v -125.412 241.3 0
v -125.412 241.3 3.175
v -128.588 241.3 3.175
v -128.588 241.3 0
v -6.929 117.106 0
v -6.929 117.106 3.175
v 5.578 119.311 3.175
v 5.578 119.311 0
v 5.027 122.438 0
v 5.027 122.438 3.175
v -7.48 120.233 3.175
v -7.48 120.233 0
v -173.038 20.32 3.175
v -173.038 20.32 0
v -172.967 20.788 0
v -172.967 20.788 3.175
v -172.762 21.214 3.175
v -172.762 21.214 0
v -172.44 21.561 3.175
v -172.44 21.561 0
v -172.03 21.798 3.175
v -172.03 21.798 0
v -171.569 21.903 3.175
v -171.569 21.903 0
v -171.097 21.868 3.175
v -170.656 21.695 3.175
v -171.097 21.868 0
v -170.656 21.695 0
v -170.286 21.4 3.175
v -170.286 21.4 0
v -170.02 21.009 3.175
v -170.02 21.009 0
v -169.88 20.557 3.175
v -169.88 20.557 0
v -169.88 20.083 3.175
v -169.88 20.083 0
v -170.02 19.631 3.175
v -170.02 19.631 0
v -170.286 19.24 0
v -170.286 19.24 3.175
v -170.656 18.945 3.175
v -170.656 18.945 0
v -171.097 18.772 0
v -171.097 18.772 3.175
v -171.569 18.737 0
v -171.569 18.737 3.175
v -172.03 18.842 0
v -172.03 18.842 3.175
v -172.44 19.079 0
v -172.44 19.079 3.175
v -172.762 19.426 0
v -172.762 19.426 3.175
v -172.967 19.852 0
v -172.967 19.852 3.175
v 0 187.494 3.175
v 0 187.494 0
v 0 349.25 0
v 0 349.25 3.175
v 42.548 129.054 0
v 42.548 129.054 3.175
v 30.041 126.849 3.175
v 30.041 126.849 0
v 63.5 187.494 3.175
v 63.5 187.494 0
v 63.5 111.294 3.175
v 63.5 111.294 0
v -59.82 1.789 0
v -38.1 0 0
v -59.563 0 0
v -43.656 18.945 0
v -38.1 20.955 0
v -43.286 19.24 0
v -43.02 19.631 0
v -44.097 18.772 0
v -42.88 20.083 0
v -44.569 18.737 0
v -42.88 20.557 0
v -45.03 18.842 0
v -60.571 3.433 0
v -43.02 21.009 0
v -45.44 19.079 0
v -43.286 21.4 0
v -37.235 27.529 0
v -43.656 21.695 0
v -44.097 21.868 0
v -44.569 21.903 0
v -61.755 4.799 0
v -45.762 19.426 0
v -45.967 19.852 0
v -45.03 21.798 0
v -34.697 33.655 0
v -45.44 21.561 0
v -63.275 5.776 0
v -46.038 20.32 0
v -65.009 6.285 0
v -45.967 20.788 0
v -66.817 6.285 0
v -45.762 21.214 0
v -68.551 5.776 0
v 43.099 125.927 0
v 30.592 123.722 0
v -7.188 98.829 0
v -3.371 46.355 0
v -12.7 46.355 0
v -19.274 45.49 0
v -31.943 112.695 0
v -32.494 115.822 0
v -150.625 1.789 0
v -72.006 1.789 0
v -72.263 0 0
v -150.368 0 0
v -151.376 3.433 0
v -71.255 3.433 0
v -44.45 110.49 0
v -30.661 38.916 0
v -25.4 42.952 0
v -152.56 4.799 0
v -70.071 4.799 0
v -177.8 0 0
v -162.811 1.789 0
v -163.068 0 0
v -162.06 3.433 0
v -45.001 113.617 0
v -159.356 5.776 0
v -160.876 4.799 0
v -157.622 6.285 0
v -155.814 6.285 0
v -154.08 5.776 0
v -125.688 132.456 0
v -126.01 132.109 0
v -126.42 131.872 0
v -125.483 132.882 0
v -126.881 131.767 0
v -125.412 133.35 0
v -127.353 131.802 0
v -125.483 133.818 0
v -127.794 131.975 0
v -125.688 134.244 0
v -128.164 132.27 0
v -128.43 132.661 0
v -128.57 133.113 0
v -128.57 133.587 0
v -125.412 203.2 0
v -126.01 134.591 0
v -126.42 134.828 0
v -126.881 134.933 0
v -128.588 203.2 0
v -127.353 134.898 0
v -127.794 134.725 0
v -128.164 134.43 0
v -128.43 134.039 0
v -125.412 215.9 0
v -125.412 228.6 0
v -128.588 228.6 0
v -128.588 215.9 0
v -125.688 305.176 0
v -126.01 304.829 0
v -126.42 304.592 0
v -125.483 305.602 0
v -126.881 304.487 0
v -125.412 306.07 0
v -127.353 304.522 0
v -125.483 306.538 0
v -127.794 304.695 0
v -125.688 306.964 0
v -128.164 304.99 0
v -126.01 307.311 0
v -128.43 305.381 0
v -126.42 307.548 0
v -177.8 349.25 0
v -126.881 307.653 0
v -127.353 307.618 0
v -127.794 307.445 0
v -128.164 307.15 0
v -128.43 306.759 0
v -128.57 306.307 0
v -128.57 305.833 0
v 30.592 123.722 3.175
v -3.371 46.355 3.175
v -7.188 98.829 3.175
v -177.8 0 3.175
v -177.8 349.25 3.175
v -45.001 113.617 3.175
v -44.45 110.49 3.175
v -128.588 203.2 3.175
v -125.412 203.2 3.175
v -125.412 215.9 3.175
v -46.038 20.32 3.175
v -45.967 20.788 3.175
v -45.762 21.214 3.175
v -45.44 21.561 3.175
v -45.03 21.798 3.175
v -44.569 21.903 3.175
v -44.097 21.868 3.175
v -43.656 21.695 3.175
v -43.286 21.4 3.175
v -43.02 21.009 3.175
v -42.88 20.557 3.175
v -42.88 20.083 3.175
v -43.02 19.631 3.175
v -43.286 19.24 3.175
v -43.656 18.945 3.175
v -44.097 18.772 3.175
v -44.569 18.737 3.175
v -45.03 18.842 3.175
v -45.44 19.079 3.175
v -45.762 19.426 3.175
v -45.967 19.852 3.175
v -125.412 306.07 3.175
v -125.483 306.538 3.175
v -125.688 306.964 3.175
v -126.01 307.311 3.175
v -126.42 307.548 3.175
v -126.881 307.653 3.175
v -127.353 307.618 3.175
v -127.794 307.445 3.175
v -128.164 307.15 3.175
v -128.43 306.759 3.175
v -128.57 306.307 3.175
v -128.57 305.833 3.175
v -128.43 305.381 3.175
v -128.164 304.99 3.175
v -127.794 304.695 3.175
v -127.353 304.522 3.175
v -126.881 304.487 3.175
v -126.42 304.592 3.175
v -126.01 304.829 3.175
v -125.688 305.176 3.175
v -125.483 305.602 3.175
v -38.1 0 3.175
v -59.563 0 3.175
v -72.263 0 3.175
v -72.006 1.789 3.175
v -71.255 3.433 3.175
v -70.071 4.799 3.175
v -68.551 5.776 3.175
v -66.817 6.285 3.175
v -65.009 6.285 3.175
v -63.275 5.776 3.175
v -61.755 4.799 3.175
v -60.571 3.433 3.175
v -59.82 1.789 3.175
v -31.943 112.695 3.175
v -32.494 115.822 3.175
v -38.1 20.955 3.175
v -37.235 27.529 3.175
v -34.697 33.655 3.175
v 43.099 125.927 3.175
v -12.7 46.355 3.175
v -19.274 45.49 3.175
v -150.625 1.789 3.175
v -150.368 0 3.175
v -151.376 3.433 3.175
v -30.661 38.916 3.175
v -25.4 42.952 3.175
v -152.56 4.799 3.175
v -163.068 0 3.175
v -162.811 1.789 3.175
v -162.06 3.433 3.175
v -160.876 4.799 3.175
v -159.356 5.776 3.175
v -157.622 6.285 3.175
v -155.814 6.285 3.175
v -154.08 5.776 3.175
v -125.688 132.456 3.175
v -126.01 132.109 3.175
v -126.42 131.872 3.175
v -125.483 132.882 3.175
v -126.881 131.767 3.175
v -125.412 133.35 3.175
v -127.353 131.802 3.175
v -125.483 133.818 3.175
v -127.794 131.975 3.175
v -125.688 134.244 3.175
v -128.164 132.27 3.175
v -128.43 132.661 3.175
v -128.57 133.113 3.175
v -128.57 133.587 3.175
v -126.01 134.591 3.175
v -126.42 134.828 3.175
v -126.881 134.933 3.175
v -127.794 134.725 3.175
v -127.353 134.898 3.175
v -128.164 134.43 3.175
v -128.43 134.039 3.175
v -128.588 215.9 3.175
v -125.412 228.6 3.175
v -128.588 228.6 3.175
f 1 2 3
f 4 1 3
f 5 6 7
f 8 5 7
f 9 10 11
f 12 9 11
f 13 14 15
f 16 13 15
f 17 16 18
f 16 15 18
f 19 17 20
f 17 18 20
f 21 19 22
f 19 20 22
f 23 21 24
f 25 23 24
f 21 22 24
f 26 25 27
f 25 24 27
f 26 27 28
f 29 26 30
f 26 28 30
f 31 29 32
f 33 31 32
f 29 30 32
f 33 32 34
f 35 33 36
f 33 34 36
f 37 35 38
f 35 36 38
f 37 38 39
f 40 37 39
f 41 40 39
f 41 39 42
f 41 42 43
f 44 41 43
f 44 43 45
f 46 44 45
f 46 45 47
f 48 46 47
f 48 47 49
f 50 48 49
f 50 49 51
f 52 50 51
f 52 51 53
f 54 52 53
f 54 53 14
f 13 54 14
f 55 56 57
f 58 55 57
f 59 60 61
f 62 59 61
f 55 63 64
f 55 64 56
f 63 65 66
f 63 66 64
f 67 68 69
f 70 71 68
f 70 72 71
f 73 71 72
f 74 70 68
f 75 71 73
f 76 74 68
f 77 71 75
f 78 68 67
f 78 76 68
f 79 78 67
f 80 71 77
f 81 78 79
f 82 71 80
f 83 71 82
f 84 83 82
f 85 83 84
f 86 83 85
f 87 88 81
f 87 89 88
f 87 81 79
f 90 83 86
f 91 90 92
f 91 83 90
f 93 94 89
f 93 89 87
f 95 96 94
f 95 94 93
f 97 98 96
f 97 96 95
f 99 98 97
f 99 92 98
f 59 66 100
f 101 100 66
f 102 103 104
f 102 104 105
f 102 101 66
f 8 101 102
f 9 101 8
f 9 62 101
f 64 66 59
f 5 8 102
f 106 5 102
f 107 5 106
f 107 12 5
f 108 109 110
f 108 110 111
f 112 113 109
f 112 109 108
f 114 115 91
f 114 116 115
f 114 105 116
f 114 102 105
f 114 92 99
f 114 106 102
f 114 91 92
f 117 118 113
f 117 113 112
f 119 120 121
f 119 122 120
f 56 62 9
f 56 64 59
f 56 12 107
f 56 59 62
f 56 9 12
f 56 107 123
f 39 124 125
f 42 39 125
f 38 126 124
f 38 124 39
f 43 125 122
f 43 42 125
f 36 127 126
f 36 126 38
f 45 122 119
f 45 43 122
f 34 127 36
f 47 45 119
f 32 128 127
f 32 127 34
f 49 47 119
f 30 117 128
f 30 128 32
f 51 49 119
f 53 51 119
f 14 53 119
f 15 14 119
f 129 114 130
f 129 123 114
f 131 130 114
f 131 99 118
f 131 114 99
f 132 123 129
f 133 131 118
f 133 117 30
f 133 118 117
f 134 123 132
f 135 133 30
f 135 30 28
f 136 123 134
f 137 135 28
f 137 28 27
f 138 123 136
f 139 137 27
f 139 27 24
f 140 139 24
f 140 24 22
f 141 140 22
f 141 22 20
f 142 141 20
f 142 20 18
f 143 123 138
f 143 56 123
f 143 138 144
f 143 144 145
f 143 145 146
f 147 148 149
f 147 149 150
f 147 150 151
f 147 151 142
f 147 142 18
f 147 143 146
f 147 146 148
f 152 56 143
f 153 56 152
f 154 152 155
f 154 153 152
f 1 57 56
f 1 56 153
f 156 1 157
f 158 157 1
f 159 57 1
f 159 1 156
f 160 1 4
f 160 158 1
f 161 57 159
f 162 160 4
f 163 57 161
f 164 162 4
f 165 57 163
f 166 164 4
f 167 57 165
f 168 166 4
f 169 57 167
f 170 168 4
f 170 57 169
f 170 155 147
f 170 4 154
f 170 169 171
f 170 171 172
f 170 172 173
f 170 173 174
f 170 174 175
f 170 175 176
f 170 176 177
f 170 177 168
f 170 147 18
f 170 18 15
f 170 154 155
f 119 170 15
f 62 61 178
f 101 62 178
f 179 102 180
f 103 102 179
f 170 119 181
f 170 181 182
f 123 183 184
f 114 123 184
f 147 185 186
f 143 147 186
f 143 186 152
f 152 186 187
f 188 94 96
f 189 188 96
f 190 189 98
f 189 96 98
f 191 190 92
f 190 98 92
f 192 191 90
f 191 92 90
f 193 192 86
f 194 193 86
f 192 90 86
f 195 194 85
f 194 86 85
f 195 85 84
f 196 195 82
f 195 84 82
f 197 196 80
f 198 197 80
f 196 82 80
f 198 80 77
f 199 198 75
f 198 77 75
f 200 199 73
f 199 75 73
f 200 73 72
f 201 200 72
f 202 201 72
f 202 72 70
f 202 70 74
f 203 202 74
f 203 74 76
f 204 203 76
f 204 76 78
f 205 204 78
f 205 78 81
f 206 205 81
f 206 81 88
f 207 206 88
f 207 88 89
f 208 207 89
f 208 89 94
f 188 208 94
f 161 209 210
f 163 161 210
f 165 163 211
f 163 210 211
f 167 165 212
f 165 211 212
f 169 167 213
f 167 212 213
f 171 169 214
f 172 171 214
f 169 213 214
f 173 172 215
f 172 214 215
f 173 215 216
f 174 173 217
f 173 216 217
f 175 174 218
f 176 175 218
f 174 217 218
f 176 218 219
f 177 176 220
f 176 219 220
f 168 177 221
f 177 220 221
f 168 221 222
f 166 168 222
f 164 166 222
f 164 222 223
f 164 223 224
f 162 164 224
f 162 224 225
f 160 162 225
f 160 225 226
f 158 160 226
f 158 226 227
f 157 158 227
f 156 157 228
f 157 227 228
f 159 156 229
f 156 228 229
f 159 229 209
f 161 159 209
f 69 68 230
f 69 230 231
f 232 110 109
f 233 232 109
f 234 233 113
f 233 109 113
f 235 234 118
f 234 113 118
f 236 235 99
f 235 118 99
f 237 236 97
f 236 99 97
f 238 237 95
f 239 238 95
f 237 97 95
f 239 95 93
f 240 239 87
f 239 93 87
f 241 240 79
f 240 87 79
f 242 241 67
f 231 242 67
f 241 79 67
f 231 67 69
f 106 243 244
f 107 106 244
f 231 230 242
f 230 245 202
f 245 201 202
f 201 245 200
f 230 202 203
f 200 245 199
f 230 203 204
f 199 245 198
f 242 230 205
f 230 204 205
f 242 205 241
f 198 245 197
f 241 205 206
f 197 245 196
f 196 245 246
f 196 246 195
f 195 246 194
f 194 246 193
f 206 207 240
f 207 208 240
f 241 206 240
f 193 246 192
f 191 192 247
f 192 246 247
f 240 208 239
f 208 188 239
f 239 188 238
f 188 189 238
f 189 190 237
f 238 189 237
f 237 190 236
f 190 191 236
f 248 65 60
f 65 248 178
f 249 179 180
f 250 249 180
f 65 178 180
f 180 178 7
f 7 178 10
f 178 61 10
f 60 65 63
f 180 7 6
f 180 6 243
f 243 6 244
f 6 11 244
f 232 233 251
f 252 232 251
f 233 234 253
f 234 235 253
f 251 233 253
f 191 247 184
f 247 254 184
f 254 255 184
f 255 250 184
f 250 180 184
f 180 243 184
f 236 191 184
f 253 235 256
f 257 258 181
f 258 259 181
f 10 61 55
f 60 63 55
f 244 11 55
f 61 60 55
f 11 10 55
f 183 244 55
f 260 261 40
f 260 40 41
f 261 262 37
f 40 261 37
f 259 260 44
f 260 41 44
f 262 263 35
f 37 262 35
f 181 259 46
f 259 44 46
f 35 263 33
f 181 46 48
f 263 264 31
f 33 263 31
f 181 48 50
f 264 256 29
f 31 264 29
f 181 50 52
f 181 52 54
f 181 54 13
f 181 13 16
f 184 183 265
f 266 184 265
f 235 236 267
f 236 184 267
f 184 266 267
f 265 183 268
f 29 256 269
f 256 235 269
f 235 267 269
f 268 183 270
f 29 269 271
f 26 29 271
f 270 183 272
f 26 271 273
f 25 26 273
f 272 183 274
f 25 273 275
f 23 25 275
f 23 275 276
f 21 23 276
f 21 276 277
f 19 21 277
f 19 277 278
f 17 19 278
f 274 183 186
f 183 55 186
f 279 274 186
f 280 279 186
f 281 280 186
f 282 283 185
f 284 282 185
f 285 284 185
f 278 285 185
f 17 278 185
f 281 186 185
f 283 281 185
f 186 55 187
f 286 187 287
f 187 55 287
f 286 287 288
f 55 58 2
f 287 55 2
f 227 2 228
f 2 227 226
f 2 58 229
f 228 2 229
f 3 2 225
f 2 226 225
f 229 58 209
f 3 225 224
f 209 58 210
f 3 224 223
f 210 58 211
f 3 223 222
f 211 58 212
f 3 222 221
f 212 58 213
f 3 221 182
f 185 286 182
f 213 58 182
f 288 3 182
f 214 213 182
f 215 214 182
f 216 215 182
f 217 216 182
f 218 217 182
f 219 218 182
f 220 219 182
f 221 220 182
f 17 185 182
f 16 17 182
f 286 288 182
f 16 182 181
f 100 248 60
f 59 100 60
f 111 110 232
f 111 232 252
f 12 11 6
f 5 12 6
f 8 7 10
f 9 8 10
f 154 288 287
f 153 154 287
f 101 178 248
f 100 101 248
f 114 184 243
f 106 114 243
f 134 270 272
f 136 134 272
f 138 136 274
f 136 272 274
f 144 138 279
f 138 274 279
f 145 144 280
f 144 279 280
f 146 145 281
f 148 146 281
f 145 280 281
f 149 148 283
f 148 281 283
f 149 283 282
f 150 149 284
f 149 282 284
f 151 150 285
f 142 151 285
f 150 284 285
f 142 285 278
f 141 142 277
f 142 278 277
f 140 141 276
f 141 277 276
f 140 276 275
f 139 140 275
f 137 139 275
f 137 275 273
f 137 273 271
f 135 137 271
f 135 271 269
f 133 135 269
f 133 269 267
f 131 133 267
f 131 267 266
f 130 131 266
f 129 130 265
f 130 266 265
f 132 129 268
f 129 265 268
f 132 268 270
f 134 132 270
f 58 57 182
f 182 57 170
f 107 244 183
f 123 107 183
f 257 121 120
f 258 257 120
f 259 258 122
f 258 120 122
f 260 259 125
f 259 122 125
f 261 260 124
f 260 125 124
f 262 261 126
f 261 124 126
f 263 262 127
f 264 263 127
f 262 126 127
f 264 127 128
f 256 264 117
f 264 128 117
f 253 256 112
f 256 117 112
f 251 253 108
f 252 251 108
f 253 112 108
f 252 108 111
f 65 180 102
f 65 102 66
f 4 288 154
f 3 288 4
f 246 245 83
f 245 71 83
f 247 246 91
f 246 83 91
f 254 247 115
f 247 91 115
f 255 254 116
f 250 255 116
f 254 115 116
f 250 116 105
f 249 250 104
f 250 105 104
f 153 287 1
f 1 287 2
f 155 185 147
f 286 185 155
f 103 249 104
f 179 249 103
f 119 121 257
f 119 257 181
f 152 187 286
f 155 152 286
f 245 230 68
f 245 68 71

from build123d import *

# Parameters (mm, degrees)
BOSS_EXTRUDE1_DEPTH = 3.175
SKETCH2_R           = 1.5875
CUT_EXTRUDE1_DEPTH  = 3.175
BOSS_EXTRUDE2_DEPTH = 3.175
CUT_EXTRUDE2_DEPTH  = 3.175
SKETCH5_W           = 1.5875
SKETCH5_H           = 12.7
CUT_EXTRUDE3_DEPTH  = 10.16
LPATTERN1_COUNT     = 2
LPATTERN1_PITCH     = 25.4
SKETCH8_W           = 38.1
SKETCH8_H           = 46.355
CUT_EXTRUDE6_DEPTH  = 12.7
SKETCH10_R          = 1.5875
CUT_EXTRUDE7_DEPTH  = 7.62
SKETCH11_R          = 6.35
CUT_EXTRUDE8_DEPTH  = 12.7
FILLET1_R           = 25.4
SKETCH13_W          = 25.4
SKETCH13_H          = 177.8
BOSS_EXTRUDE3_DEPTH = 3.175
LPATTERN2_COUNT     = 2
LPATTERN2_PITCH     = 76.2


with BuildPart() as part:
    # Sketch1 → Boss-Extrude1 (new body)
    with BuildSketch(Plane.XY):
        Polygon((0, 0), (-177.8, 0), (-177.8, 349.25), (-25.4, 349.25), align=None)
    extrude(amount=BOSS_EXTRUDE1_DEPTH)

    # Sketch2 → Cut-Extrude1 (cut)
    with BuildSketch(Plane.XY.offset(3.175)):
        with Locations((-127, 133.35)):
            Circle(SKETCH2_R)
        with Locations((-127, 306.07)):
            Circle(SKETCH2_R)
    extrude(amount=-CUT_EXTRUDE1_DEPTH, mode=Mode.SUBTRACT)

    # Sketch3 → Boss-Extrude2 (add)
    with BuildSketch(Plane.XY.offset(3.175)):
        Polygon((-63.5, 88.9), (63.5, 111.29352655), (63.5, 187.49352655), (-63.5, 187.49352655), align=None)
    extrude(amount=-BOSS_EXTRUDE2_DEPTH)

    # Sketch4 → Cut-Extrude2 (cut)
    with BuildSketch(Plane.XY.offset(3.175)):
        Polygon((-44.45, 110.49), (-31.942941537, 112.695331856), (-32.494274501, 115.822096472), (-45.001332964, 113.616764616), align=None)
        Polygon((-6.92882461, 117.105995569), (5.578233853, 119.311327425), (5.026900889, 122.438092041), (-7.480157574, 120.232760185), align=None)
    cut_extrude2 = extrude(amount=-CUT_EXTRUDE2_DEPTH, mode=Mode.SUBTRACT)

    # Sketch5 → Cut-Extrude3 (cut)
    with BuildSketch(Plane.XY.offset(3.175)):
        with Locations((-126.20625, 209.55)):
            Rectangle(SKETCH5_W, SKETCH5_H)
        with Locations((-127.79375, 209.55)):
            Rectangle(SKETCH5_W, SKETCH5_H)
    cut_extrude3 = extrude(amount=-CUT_EXTRUDE3_DEPTH, mode=Mode.SUBTRACT)

    # LPattern1: Cut-Extrude3 ×2
    with Locations(*[(0, i * LPATTERN1_PITCH, 0) for i in range(1, LPATTERN1_COUNT)]):
        add(cut_extrude3, mode=Mode.SUBTRACT)

    # Sketch8 → Cut-Extrude6 (cut)
    with BuildSketch(Plane.XY.offset(3.175)):
        with Locations((-19.05, 23.1775)):
            Rectangle(SKETCH8_W, SKETCH8_H)
    extrude(amount=-CUT_EXTRUDE6_DEPTH, mode=Mode.SUBTRACT)

    # Sketch10 → Cut-Extrude7 (cut)
    with BuildSketch(Plane(origin=(0, 0, 0), x_dir=(-1, 0, 0), z_dir=(0, 0, -1))):
        with Locations((171.45, 20.32)):
            Circle(SKETCH10_R)
        with Locations((44.45, 20.32)):
            Circle(SKETCH10_R)
    extrude(amount=-CUT_EXTRUDE7_DEPTH, mode=Mode.SUBTRACT)

    # Sketch11 → Cut-Extrude8 (cut)
    with BuildSketch(Plane(origin=(0, 0, 0), x_dir=(-1, 0, 0), z_dir=(0, 0, -1))):
        with Locations((156.718, 0)):
            Circle(SKETCH11_R)
        with Locations((65.913, 0)):
            Circle(SKETCH11_R)
    extrude(amount=-CUT_EXTRUDE8_DEPTH, mode=Mode.SUBTRACT)

    # Fillet1
    fillet1_edges = [part.edges().sort_by_distance(p)[0] for p in [
        (-38.1, 46.355, 1.5875),
    ]]
    fillet(fillet1_edges, radius=FILLET1_R)

    # Sketch13 → Boss-Extrude3 (add)
    with BuildSketch(Plane(origin=(0, 0, 0), x_dir=(-1, 0, 0), z_dir=(0, 0, -1))):
        with Locations((12.7, 260.35)):
            Rectangle(SKETCH13_W, SKETCH13_H)
    extrude(amount=-BOSS_EXTRUDE3_DEPTH)

    # LPattern2: Cut-Extrude2 ×2
    with Locations(*[Vector(0.984807753, 0.173648178, 0) * (i * LPATTERN2_PITCH) for i in range(1, LPATTERN2_COUNT)]):
        add(cut_extrude2, mode=Mode.SUBTRACT)


solid = part.part
